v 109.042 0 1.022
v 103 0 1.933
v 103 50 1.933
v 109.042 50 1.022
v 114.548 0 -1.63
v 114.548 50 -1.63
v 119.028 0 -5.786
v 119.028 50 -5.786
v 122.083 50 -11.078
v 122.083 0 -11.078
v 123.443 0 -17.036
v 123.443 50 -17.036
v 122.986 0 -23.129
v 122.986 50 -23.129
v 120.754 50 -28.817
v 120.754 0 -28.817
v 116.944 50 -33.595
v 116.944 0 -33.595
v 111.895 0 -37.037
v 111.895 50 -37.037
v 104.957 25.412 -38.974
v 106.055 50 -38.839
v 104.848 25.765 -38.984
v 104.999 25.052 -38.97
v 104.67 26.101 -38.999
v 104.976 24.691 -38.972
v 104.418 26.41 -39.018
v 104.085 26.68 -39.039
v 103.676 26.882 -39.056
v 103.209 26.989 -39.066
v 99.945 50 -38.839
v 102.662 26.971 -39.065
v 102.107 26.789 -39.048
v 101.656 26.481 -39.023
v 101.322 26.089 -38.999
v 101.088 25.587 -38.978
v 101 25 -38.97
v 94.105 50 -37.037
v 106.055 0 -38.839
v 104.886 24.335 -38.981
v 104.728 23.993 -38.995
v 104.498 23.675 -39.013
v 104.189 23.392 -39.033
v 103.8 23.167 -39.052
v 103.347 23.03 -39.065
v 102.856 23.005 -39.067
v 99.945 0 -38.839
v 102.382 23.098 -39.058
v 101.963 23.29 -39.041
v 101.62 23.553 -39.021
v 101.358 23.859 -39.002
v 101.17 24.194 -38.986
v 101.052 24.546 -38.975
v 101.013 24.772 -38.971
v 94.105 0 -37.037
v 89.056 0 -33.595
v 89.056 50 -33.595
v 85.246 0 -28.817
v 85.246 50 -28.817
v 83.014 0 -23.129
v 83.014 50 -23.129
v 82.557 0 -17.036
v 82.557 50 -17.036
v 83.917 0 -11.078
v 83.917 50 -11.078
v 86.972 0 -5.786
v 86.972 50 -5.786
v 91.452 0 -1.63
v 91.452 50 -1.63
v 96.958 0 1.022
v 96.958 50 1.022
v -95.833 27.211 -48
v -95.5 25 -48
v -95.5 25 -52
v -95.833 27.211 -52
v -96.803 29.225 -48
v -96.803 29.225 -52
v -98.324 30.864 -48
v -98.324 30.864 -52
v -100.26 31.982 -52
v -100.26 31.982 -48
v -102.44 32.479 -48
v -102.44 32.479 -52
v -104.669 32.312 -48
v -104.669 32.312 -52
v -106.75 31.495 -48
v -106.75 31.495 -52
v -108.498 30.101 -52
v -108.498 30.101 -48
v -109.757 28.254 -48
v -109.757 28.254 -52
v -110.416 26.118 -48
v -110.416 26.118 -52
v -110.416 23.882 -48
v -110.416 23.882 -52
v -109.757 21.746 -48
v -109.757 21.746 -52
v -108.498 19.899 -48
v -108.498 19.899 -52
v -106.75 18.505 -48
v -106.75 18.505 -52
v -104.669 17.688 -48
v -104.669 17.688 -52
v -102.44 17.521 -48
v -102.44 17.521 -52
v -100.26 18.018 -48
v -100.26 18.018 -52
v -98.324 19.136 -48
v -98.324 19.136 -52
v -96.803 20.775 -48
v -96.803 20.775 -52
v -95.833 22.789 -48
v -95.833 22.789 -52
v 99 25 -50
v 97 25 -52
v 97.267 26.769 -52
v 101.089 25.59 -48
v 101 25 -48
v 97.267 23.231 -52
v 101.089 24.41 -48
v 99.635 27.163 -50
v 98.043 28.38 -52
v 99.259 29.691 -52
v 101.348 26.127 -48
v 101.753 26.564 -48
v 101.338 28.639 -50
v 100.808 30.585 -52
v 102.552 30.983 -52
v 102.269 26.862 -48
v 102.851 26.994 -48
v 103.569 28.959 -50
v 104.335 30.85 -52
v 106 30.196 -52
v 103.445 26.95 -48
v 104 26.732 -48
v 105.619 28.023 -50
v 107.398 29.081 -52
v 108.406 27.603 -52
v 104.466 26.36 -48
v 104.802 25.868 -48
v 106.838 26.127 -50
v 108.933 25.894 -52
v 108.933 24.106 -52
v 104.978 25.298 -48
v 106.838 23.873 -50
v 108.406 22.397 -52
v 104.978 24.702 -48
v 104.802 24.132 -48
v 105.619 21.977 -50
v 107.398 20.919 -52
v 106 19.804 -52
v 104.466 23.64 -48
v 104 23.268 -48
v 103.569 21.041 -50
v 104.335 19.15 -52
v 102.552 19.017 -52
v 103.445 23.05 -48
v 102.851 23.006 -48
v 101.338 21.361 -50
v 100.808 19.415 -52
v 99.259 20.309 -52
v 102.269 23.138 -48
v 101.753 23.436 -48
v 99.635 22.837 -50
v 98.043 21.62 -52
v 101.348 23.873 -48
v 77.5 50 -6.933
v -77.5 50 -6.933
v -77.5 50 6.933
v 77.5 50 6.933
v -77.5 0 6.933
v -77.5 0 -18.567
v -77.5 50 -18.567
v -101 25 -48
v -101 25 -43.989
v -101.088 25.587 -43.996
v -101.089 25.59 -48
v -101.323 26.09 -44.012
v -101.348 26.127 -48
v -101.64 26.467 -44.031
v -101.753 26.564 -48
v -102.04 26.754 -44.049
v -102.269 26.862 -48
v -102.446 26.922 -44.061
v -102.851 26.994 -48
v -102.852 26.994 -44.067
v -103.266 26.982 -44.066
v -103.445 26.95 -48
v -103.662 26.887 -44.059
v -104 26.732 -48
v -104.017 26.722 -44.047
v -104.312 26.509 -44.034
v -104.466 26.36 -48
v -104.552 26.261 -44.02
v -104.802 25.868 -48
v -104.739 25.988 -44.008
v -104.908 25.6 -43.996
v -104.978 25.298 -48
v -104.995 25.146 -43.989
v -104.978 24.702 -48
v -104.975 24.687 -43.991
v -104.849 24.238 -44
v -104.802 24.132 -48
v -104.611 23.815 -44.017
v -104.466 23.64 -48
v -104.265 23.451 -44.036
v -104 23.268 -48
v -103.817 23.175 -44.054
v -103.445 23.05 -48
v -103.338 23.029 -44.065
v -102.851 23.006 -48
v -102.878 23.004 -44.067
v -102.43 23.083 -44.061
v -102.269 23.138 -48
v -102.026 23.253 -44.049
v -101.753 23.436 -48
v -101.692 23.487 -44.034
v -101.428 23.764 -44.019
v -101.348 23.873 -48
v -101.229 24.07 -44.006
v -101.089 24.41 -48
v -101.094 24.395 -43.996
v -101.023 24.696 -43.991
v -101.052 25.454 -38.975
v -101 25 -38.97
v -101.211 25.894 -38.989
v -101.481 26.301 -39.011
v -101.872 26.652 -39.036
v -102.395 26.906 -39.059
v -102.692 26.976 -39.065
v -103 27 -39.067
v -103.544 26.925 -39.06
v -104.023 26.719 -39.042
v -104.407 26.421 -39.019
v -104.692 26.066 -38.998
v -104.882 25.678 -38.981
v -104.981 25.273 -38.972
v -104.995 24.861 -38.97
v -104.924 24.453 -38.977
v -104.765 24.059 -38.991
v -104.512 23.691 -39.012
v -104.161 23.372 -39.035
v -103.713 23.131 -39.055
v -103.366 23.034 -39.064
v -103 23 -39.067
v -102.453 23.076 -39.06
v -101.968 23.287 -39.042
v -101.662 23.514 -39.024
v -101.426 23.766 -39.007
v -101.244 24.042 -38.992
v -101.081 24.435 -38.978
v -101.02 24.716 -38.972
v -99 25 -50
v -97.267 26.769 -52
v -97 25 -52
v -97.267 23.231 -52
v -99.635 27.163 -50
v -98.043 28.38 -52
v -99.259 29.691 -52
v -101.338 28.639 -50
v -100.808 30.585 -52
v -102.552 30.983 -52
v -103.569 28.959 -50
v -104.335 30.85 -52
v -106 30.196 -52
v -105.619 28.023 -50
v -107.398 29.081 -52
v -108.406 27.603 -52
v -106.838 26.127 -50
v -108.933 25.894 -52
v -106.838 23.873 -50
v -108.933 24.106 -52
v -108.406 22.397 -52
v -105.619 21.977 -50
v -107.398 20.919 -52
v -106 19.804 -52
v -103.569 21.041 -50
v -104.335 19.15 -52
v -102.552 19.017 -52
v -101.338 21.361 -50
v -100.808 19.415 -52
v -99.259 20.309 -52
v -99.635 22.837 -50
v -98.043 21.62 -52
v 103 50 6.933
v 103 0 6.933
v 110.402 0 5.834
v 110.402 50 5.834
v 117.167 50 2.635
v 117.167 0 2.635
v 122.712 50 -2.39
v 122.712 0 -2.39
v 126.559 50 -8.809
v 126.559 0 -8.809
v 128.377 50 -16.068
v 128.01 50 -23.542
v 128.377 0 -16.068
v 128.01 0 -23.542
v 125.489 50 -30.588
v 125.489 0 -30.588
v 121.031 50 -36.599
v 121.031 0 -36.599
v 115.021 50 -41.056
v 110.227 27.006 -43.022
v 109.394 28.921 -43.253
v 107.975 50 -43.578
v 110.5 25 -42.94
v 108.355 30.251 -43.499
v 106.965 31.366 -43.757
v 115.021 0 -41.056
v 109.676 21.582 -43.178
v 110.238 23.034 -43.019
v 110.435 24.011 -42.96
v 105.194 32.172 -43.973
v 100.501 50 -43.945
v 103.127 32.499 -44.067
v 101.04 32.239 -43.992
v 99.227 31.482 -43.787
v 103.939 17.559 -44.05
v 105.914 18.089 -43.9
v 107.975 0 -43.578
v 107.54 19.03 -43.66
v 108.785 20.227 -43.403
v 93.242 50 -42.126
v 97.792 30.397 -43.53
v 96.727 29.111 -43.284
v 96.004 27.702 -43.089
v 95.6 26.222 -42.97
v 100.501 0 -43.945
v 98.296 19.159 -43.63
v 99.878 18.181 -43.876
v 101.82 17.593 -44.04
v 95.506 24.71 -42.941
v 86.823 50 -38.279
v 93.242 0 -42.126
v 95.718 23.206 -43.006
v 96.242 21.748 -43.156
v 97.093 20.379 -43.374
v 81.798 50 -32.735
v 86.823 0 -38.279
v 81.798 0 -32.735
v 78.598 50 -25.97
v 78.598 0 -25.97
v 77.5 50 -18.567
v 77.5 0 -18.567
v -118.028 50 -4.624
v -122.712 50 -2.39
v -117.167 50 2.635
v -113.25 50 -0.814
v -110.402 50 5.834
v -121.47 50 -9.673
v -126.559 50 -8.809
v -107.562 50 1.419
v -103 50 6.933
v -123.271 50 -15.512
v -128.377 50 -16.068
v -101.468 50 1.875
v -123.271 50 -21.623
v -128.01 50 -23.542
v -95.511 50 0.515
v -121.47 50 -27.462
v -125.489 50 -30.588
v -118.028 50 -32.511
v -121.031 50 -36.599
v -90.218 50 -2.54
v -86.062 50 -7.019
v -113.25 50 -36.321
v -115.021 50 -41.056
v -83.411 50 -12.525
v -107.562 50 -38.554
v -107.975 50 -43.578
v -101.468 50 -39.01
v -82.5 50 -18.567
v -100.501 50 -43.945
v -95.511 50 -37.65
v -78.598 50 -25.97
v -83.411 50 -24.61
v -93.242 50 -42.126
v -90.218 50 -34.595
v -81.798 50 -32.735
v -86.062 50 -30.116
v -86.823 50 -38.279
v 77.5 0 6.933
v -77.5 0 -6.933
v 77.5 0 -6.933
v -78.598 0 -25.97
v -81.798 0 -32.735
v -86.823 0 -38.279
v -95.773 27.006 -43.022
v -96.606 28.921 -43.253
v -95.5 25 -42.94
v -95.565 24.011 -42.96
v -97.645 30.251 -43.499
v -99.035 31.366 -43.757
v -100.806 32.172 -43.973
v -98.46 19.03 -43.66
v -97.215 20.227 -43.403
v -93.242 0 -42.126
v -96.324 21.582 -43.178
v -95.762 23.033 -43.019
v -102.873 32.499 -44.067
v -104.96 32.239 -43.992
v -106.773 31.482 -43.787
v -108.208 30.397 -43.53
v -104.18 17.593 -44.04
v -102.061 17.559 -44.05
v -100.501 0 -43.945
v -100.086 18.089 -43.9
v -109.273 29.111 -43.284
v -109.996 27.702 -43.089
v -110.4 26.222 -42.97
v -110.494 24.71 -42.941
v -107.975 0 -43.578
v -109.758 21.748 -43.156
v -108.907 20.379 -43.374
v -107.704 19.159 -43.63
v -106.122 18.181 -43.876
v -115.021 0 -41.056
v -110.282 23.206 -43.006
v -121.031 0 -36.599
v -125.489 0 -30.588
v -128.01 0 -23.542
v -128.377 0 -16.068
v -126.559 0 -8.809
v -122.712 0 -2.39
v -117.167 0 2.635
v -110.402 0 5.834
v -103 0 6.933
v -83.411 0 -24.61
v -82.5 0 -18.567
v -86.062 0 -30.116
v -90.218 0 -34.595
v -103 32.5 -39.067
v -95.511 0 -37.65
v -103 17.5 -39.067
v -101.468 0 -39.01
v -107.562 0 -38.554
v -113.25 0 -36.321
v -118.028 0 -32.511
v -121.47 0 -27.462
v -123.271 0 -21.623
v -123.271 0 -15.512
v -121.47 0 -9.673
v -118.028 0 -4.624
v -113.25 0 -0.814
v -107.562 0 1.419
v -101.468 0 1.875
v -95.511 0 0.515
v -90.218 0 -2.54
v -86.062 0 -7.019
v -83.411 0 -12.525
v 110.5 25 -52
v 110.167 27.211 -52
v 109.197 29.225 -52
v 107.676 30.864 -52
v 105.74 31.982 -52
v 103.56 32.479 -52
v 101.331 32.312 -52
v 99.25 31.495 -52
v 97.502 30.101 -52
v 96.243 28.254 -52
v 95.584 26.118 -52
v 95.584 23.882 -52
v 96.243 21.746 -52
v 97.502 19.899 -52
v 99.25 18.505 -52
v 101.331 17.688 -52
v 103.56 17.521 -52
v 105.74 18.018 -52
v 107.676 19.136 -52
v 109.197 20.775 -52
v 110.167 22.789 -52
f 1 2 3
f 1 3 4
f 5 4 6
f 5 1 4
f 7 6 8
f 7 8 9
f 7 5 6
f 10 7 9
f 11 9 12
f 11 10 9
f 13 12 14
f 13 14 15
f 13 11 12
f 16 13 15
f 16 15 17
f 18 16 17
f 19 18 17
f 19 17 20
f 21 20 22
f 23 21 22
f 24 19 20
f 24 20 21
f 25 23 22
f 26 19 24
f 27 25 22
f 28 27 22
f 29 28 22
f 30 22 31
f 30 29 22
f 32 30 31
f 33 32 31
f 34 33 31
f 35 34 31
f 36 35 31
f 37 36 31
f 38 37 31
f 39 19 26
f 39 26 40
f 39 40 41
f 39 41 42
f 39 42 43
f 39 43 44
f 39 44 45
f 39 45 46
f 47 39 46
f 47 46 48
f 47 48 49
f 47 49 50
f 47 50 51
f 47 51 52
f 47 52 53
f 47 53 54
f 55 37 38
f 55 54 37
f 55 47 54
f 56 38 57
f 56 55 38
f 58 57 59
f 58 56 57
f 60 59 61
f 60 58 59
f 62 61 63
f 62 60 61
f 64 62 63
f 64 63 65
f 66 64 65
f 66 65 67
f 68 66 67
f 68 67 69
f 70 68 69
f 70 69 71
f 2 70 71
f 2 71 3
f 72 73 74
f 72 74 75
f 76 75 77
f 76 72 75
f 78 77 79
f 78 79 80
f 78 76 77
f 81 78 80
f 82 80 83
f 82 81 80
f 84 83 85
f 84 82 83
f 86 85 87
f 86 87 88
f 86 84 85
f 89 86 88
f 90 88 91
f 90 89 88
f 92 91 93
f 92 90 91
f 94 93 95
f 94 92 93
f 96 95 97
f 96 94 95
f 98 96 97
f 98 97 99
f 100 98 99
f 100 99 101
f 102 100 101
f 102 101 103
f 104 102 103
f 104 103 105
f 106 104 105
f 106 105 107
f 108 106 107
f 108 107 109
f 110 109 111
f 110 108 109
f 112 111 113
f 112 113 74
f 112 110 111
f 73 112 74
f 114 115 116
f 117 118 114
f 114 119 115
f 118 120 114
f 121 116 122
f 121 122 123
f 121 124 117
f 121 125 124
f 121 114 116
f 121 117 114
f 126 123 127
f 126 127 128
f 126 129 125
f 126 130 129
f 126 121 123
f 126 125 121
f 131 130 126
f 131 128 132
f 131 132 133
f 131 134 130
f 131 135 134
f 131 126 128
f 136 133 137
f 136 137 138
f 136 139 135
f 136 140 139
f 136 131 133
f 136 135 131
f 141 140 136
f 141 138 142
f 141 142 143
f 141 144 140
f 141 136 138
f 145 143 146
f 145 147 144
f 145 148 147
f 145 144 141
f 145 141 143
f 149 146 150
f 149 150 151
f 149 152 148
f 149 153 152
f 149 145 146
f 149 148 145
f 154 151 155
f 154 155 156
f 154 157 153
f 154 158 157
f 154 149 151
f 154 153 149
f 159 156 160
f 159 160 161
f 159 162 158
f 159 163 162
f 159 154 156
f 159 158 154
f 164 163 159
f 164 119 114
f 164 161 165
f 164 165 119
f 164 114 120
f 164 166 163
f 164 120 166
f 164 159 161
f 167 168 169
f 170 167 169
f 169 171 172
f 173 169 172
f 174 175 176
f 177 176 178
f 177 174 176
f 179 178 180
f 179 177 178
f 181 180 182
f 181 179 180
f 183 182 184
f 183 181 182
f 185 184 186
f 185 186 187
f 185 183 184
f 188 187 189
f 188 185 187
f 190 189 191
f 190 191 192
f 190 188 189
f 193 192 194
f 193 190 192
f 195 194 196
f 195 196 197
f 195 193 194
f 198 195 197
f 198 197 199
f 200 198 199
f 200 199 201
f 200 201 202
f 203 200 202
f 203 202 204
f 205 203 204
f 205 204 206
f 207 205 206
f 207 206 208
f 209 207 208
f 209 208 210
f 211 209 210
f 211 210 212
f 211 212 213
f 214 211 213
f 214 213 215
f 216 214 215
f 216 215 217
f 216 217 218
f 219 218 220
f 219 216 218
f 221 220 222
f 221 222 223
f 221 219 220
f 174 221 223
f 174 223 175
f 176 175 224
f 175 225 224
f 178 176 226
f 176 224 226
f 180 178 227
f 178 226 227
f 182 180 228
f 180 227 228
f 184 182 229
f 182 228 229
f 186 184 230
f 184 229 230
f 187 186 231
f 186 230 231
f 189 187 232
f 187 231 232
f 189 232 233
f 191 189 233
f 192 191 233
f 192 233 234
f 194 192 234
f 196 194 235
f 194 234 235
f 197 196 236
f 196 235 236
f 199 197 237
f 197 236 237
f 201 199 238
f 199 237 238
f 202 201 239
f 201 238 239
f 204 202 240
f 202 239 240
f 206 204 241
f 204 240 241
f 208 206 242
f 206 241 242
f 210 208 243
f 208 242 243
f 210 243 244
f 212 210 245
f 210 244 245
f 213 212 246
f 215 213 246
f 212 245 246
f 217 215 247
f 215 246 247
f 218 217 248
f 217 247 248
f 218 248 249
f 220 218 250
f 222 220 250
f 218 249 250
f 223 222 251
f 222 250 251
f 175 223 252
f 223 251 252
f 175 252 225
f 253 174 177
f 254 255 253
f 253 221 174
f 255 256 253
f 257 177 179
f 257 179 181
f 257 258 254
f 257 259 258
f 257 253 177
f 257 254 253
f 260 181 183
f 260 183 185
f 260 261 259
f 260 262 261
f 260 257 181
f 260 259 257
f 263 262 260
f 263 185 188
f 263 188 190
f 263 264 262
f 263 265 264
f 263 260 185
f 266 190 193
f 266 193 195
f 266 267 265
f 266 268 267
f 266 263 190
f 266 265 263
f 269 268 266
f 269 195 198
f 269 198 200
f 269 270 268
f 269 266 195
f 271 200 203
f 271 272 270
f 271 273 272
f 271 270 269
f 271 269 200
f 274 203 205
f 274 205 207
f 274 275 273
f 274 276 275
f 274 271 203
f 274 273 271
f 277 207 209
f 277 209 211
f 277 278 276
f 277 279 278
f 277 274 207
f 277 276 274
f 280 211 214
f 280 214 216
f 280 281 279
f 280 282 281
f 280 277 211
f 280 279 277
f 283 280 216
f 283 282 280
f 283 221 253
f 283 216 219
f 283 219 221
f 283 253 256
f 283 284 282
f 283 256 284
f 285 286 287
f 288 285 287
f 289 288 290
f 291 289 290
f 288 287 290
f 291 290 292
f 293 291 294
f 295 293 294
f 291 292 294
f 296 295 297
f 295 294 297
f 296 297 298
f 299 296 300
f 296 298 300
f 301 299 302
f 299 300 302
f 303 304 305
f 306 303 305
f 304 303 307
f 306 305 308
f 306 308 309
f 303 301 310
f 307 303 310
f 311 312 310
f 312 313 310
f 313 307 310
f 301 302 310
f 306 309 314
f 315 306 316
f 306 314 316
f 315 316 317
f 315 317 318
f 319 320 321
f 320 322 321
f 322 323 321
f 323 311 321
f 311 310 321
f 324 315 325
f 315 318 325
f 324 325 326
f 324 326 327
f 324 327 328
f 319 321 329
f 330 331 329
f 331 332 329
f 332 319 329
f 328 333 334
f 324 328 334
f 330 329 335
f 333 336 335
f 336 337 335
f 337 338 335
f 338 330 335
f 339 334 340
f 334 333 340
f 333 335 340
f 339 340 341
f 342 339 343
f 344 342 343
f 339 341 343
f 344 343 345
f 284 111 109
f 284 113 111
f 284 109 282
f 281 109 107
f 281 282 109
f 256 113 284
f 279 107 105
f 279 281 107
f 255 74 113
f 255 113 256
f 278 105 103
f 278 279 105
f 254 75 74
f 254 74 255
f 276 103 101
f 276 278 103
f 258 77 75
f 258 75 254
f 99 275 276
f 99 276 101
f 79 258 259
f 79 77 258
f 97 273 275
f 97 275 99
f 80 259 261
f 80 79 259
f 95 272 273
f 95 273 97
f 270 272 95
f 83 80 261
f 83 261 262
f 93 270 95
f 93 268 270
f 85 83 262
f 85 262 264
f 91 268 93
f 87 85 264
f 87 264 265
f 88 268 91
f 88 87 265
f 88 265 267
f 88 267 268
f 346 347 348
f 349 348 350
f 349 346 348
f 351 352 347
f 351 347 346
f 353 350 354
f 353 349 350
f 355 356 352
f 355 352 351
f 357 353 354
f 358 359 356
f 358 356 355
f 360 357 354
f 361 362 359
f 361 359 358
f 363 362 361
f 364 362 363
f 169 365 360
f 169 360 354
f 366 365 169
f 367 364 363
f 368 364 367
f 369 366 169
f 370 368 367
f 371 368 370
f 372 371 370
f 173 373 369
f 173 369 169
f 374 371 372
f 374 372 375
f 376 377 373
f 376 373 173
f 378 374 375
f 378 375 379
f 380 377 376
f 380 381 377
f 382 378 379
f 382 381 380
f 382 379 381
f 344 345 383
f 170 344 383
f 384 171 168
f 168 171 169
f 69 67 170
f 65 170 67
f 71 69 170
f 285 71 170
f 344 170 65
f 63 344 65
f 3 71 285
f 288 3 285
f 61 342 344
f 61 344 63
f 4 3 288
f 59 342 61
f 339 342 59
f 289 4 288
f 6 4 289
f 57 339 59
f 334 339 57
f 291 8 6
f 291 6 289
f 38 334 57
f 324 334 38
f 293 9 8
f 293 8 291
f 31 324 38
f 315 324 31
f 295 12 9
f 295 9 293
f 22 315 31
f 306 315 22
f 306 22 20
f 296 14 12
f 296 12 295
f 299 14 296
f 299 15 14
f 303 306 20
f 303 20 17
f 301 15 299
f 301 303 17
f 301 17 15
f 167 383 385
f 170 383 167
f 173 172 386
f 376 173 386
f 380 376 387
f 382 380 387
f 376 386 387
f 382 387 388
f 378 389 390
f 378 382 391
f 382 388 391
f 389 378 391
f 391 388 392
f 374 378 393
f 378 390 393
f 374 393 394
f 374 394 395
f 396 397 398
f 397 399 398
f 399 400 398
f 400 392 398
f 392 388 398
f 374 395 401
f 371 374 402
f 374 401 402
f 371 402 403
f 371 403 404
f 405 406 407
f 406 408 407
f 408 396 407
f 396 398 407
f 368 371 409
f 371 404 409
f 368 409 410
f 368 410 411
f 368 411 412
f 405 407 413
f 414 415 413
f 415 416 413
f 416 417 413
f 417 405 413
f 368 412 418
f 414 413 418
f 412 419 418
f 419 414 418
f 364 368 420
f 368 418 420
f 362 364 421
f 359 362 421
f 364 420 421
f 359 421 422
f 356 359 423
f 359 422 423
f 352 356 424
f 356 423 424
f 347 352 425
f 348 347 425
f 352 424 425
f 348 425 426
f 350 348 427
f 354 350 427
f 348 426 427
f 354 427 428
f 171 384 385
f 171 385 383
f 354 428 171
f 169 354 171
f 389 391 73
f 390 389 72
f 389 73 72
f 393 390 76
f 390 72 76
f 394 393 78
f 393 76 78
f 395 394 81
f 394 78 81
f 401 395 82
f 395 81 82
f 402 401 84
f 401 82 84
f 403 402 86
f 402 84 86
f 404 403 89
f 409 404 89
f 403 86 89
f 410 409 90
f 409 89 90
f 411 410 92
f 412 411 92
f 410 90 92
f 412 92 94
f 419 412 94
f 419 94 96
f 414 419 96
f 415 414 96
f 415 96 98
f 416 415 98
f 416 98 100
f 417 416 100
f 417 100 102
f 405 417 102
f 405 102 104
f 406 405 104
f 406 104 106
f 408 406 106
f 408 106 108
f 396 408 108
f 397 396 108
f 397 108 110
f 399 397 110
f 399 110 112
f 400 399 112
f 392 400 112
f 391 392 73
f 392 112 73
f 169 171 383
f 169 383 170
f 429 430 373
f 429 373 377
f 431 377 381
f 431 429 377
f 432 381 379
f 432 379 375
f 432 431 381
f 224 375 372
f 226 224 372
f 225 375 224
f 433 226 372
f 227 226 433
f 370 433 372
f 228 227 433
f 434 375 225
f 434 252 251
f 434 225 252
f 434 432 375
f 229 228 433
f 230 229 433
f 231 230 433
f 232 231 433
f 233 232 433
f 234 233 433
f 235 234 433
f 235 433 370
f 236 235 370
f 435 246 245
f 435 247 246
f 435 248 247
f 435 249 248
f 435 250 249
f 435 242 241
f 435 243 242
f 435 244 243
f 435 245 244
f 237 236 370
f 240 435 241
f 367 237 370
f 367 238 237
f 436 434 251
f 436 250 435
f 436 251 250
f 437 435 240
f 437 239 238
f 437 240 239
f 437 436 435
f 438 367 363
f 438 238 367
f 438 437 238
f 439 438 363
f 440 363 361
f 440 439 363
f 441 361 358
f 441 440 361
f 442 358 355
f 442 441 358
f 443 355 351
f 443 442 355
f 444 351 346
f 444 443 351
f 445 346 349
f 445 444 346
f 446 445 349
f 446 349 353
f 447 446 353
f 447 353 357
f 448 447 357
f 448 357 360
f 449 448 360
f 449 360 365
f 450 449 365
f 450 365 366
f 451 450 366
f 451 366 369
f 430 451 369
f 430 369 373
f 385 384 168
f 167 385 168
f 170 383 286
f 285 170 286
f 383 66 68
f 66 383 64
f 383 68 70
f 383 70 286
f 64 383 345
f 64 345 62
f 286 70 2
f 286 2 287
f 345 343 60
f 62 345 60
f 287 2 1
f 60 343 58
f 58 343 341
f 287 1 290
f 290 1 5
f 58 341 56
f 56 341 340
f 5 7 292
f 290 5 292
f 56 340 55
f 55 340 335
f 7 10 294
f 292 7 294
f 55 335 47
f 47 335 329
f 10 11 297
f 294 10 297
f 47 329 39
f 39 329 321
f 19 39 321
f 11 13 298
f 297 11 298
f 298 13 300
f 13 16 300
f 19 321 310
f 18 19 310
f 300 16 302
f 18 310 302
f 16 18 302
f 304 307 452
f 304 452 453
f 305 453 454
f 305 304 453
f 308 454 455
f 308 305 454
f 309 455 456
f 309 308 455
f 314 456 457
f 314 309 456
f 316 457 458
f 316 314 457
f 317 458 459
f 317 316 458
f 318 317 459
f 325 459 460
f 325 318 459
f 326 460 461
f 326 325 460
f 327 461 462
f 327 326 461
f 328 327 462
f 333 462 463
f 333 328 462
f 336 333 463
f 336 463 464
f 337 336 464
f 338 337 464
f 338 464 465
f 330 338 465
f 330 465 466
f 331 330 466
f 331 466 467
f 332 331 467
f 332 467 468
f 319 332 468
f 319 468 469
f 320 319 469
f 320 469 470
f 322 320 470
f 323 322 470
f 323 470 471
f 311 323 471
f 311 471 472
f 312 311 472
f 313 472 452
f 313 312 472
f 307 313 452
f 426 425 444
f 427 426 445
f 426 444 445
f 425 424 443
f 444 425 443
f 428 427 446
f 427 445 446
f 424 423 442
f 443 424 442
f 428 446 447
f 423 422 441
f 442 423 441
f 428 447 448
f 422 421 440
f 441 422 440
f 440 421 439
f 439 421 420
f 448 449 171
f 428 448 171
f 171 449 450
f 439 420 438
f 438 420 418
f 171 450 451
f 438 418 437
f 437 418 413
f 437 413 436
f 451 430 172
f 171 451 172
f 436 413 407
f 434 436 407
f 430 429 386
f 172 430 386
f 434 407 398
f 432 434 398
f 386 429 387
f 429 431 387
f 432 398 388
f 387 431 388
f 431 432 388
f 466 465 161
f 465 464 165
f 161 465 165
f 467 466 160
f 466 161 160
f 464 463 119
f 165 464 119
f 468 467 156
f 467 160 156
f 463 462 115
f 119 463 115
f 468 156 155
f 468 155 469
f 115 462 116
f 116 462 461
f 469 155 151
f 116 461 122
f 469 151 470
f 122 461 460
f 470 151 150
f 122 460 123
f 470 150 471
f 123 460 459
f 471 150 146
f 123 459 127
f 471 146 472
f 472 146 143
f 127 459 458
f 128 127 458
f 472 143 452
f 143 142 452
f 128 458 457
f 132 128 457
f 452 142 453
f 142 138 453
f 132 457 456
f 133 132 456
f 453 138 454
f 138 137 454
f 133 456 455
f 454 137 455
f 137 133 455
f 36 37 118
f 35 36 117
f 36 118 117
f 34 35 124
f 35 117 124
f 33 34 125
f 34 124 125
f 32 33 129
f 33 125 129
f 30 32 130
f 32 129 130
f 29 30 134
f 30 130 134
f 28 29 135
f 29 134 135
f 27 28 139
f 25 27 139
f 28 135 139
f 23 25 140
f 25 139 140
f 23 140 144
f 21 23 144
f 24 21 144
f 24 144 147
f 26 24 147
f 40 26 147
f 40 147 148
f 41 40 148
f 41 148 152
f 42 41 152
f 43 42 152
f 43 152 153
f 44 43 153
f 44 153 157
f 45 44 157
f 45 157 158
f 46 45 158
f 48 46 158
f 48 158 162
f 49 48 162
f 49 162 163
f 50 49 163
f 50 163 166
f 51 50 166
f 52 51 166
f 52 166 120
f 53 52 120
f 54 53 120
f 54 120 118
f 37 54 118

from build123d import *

# Parameters (mm, degrees)
SKETCH2_R           = 20.5
BOSS_EXTRUDE1_DEPTH = 50
SKETCH3_R           = 7.5
BOSS_EXTRUDE2_DEPTH = 10
CUT_EXTRUDE1_REACH  = 151.951
SKETCH4_R           = 2
CHAMFER1_SIZE       = 4
SPLIT1_START        = -48.0000001
SPLIT1_OUTLINE_R    = 7.5
SPLIT1_OUTLINE_R_2  = 2
SPLIT1_DEPTH        = 8.932510964
SPLIT1_2_OUTLINE_R  = 20.5
SPLIT1_2_DEPTH      = 50
SPLIT1_3_OUTLINE_W  = 2
SPLIT1_3_OUTLINE_H  = 9.030358149
SPLIT1_START_2      = -77.5
SPLIT1_5_OUTLINE_W  = 50
SPLIT1_5_OUTLINE_H  = 13.865021928
SPLIT1_5_DEPTH      = 155
SPLIT1_START_3      = -130
SPLIT1_6_OUTLINE_W  = 50
SPLIT1_6_OUTLINE_H  = 58.932510964
SPLIT1_6_DEPTH      = 207.5


with BuildPart() as part:
    # Sketch2 → Boss-Extrude1 (new body)
    # profile 1 of 2: a face of its own
    with BuildSketch(Plane(origin=(0, 0, 0), x_dir=(1, 0, 0), z_dir=(0, 1, 0))):
        with BuildLine():
            ThreePointArc((-77.5, 18.567489036), (-121.03122292, 36.598711956), (-103, -6.932510964))
            Line((-103, -6.932510964), (-85, -6.932510964))
            Line((-85, -6.932510964), (0, -6.932510964))
            Line((0, -6.932510964), (0, 6.932510964))
            Line((0, 6.932510964), (-77.5, 6.932510964))
            Line((-77.5, 6.932510964), (-77.5, 18.567489036))
        make_face()
        with Locations(Location((-103, 18.567489036, 0), (0, 0, 270))):
            Circle(SKETCH2_R, mode=Mode.SUBTRACT)
    # profile 2 of 2: a face of its own
    with BuildSketch(Plane(origin=(0, 0, 0), x_dir=(1, 0, 0), z_dir=(0, 1, 0))):
        with BuildLine():
            Line((0, 6.932510964), (0, -6.932510964))
            Line((0, -6.932510964), (85, -6.932510964))
            Line((85, -6.932510964), (103, -6.932510964))
            ThreePointArc((103, -6.932510964), (121.03122292, 36.598711956), (77.5, 18.567489036))
            Line((77.5, 18.567489036), (77.5, 6.932510964))
            Line((77.5, 6.932510964), (0, 6.932510964))
        make_face()
        with Locations(Location((103, 18.567489036, 0), (0, 0, 270))):
            Circle(SKETCH2_R, mode=Mode.SUBTRACT)
    extrude(amount=BOSS_EXTRUDE1_DEPTH)

    # Sketch3 → Boss-Extrude2 (add)
    with BuildSketch(Plane.XY.offset(-42)):
        with Locations((103, 25)):
            Circle(SKETCH3_R)
        with Locations((-103, 25)):
            Circle(SKETCH3_R)
    extrude(amount=-BOSS_EXTRUDE2_DEPTH)

    # Sketch4 → Cut-Extrude1 (cut, up to next)
    with BuildSketch(Plane(origin=(0, 0, -52), x_dir=(-1, 0, 0), z_dir=(0, 0, -1)), mode=Mode.PRIVATE) as cut_extrude1_sk1:
        with Locations((103, 25)):
            Circle(SKETCH4_R)
    cut_extrude1_tool1 = extrude(cut_extrude1_sk1.sketch, amount=-CUT_EXTRUDE1_REACH, mode=Mode.PRIVATE) & part.part
    # Sketch4 → Cut-Extrude1 (cut, up to next)
    with BuildSketch(Plane(origin=(0, 0, -52), x_dir=(-1, 0, 0), z_dir=(0, 0, -1)), mode=Mode.PRIVATE) as cut_extrude1_sk2:
        with Locations((-103, 25)):
            Circle(SKETCH4_R)
    cut_extrude1_tool2 = extrude(cut_extrude1_sk2.sketch, amount=-CUT_EXTRUDE1_REACH, mode=Mode.PRIVATE) & part.part
    add(cut_extrude1_tool1.solids().sort_by_distance((-103, 25, -52))[0], mode=Mode.SUBTRACT)
    add(cut_extrude1_tool2.solids().sort_by_distance((103, 25, -52))[0], mode=Mode.SUBTRACT)

    # Chamfer1
    chamfer1_edges = [part.edges().sort_by_distance(p)[0] for p in [
        (-101, 25, -52),
        (105, 25, -52),
    ]]
    chamfer(chamfer1_edges, length=CHAMFER1_SIZE)

    # Split1 6 outline → Split1 6 (cut)
    with BuildSketch(Plane.YZ.offset(SPLIT1_START_3)):
        with Locations((25, -22.533744518)):
            Rectangle(SPLIT1_6_OUTLINE_W, SPLIT1_6_OUTLINE_H)
    extrude(amount=SPLIT1_6_DEPTH, mode=Mode.SUBTRACT)


with BuildPart() as body_2:
    # Split1: read off the stored shape, not the designer's step
    # Split1 outline → Split1 (new body)
    with BuildSketch(Plane.XY.offset(SPLIT1_START)):
        with Locations((-103, 25)):
            Circle(SPLIT1_OUTLINE_R)
        with Locations((-103, 25)):
            Circle(SPLIT1_OUTLINE_R_2, mode=Mode.SUBTRACT)
    extrude(amount=SPLIT1_DEPTH)

    # Split1 2 outline → Split1 2 (add)
    with BuildSketch(Plane(origin=(0, 0, 0), x_dir=(1, 0, 0), z_dir=(0, 1, 0))):
        with BuildLine():
            Line((-103, -6.932510964), (-77.5, -6.932510964))
            Line((-77.5, -6.932510964), (-77.5, 18.567489036))
            ThreePointArc((-77.5, 18.567489036), (-121.03122292, 36.598711956), (-103, -6.932510964))
        make_face()
        with Locations((-103, 18.567489036)):
            Circle(SPLIT1_2_OUTLINE_R, mode=Mode.SUBTRACT)
    extrude(amount=SPLIT1_2_DEPTH)

    # Split1 3 outline → Split1 3 (revolve, cut)
    with BuildSketch(Plane(origin=(-103, 25, 0), x_dir=(1, 0, 0), z_dir=(0, -1, 0))):
        with Locations((1, -43.484821025)):
            Rectangle(SPLIT1_3_OUTLINE_W, SPLIT1_3_OUTLINE_H)
    revolve(axis=Axis((-103, 25, 0), (0, 0, 1)), mode=Mode.SUBTRACT)

    # Split1 4 outline → Split1 4 (revolve)
    with BuildSketch(Plane(origin=(-103, 25, 0), x_dir=(1, 0, 0), z_dir=(0, -1, 0))):
        Polygon((7.5, -48.0000001), (2, -48.0000001), (6, -52), (7.5, -52), align=None)
    revolve(axis=Axis((-103, 25, 0), (0, 0, 1)))


with BuildPart() as body_3:
    # Split1 5 outline → Split1 5 (new body)
    with BuildSketch(Plane.YZ.offset(SPLIT1_START_2)):
        with Locations((25, 0)):
            Rectangle(SPLIT1_5_OUTLINE_W, SPLIT1_5_OUTLINE_H)
    extrude(amount=SPLIT1_5_DEPTH)


solid = Compound([part.part, body_2.part, body_3.part])
